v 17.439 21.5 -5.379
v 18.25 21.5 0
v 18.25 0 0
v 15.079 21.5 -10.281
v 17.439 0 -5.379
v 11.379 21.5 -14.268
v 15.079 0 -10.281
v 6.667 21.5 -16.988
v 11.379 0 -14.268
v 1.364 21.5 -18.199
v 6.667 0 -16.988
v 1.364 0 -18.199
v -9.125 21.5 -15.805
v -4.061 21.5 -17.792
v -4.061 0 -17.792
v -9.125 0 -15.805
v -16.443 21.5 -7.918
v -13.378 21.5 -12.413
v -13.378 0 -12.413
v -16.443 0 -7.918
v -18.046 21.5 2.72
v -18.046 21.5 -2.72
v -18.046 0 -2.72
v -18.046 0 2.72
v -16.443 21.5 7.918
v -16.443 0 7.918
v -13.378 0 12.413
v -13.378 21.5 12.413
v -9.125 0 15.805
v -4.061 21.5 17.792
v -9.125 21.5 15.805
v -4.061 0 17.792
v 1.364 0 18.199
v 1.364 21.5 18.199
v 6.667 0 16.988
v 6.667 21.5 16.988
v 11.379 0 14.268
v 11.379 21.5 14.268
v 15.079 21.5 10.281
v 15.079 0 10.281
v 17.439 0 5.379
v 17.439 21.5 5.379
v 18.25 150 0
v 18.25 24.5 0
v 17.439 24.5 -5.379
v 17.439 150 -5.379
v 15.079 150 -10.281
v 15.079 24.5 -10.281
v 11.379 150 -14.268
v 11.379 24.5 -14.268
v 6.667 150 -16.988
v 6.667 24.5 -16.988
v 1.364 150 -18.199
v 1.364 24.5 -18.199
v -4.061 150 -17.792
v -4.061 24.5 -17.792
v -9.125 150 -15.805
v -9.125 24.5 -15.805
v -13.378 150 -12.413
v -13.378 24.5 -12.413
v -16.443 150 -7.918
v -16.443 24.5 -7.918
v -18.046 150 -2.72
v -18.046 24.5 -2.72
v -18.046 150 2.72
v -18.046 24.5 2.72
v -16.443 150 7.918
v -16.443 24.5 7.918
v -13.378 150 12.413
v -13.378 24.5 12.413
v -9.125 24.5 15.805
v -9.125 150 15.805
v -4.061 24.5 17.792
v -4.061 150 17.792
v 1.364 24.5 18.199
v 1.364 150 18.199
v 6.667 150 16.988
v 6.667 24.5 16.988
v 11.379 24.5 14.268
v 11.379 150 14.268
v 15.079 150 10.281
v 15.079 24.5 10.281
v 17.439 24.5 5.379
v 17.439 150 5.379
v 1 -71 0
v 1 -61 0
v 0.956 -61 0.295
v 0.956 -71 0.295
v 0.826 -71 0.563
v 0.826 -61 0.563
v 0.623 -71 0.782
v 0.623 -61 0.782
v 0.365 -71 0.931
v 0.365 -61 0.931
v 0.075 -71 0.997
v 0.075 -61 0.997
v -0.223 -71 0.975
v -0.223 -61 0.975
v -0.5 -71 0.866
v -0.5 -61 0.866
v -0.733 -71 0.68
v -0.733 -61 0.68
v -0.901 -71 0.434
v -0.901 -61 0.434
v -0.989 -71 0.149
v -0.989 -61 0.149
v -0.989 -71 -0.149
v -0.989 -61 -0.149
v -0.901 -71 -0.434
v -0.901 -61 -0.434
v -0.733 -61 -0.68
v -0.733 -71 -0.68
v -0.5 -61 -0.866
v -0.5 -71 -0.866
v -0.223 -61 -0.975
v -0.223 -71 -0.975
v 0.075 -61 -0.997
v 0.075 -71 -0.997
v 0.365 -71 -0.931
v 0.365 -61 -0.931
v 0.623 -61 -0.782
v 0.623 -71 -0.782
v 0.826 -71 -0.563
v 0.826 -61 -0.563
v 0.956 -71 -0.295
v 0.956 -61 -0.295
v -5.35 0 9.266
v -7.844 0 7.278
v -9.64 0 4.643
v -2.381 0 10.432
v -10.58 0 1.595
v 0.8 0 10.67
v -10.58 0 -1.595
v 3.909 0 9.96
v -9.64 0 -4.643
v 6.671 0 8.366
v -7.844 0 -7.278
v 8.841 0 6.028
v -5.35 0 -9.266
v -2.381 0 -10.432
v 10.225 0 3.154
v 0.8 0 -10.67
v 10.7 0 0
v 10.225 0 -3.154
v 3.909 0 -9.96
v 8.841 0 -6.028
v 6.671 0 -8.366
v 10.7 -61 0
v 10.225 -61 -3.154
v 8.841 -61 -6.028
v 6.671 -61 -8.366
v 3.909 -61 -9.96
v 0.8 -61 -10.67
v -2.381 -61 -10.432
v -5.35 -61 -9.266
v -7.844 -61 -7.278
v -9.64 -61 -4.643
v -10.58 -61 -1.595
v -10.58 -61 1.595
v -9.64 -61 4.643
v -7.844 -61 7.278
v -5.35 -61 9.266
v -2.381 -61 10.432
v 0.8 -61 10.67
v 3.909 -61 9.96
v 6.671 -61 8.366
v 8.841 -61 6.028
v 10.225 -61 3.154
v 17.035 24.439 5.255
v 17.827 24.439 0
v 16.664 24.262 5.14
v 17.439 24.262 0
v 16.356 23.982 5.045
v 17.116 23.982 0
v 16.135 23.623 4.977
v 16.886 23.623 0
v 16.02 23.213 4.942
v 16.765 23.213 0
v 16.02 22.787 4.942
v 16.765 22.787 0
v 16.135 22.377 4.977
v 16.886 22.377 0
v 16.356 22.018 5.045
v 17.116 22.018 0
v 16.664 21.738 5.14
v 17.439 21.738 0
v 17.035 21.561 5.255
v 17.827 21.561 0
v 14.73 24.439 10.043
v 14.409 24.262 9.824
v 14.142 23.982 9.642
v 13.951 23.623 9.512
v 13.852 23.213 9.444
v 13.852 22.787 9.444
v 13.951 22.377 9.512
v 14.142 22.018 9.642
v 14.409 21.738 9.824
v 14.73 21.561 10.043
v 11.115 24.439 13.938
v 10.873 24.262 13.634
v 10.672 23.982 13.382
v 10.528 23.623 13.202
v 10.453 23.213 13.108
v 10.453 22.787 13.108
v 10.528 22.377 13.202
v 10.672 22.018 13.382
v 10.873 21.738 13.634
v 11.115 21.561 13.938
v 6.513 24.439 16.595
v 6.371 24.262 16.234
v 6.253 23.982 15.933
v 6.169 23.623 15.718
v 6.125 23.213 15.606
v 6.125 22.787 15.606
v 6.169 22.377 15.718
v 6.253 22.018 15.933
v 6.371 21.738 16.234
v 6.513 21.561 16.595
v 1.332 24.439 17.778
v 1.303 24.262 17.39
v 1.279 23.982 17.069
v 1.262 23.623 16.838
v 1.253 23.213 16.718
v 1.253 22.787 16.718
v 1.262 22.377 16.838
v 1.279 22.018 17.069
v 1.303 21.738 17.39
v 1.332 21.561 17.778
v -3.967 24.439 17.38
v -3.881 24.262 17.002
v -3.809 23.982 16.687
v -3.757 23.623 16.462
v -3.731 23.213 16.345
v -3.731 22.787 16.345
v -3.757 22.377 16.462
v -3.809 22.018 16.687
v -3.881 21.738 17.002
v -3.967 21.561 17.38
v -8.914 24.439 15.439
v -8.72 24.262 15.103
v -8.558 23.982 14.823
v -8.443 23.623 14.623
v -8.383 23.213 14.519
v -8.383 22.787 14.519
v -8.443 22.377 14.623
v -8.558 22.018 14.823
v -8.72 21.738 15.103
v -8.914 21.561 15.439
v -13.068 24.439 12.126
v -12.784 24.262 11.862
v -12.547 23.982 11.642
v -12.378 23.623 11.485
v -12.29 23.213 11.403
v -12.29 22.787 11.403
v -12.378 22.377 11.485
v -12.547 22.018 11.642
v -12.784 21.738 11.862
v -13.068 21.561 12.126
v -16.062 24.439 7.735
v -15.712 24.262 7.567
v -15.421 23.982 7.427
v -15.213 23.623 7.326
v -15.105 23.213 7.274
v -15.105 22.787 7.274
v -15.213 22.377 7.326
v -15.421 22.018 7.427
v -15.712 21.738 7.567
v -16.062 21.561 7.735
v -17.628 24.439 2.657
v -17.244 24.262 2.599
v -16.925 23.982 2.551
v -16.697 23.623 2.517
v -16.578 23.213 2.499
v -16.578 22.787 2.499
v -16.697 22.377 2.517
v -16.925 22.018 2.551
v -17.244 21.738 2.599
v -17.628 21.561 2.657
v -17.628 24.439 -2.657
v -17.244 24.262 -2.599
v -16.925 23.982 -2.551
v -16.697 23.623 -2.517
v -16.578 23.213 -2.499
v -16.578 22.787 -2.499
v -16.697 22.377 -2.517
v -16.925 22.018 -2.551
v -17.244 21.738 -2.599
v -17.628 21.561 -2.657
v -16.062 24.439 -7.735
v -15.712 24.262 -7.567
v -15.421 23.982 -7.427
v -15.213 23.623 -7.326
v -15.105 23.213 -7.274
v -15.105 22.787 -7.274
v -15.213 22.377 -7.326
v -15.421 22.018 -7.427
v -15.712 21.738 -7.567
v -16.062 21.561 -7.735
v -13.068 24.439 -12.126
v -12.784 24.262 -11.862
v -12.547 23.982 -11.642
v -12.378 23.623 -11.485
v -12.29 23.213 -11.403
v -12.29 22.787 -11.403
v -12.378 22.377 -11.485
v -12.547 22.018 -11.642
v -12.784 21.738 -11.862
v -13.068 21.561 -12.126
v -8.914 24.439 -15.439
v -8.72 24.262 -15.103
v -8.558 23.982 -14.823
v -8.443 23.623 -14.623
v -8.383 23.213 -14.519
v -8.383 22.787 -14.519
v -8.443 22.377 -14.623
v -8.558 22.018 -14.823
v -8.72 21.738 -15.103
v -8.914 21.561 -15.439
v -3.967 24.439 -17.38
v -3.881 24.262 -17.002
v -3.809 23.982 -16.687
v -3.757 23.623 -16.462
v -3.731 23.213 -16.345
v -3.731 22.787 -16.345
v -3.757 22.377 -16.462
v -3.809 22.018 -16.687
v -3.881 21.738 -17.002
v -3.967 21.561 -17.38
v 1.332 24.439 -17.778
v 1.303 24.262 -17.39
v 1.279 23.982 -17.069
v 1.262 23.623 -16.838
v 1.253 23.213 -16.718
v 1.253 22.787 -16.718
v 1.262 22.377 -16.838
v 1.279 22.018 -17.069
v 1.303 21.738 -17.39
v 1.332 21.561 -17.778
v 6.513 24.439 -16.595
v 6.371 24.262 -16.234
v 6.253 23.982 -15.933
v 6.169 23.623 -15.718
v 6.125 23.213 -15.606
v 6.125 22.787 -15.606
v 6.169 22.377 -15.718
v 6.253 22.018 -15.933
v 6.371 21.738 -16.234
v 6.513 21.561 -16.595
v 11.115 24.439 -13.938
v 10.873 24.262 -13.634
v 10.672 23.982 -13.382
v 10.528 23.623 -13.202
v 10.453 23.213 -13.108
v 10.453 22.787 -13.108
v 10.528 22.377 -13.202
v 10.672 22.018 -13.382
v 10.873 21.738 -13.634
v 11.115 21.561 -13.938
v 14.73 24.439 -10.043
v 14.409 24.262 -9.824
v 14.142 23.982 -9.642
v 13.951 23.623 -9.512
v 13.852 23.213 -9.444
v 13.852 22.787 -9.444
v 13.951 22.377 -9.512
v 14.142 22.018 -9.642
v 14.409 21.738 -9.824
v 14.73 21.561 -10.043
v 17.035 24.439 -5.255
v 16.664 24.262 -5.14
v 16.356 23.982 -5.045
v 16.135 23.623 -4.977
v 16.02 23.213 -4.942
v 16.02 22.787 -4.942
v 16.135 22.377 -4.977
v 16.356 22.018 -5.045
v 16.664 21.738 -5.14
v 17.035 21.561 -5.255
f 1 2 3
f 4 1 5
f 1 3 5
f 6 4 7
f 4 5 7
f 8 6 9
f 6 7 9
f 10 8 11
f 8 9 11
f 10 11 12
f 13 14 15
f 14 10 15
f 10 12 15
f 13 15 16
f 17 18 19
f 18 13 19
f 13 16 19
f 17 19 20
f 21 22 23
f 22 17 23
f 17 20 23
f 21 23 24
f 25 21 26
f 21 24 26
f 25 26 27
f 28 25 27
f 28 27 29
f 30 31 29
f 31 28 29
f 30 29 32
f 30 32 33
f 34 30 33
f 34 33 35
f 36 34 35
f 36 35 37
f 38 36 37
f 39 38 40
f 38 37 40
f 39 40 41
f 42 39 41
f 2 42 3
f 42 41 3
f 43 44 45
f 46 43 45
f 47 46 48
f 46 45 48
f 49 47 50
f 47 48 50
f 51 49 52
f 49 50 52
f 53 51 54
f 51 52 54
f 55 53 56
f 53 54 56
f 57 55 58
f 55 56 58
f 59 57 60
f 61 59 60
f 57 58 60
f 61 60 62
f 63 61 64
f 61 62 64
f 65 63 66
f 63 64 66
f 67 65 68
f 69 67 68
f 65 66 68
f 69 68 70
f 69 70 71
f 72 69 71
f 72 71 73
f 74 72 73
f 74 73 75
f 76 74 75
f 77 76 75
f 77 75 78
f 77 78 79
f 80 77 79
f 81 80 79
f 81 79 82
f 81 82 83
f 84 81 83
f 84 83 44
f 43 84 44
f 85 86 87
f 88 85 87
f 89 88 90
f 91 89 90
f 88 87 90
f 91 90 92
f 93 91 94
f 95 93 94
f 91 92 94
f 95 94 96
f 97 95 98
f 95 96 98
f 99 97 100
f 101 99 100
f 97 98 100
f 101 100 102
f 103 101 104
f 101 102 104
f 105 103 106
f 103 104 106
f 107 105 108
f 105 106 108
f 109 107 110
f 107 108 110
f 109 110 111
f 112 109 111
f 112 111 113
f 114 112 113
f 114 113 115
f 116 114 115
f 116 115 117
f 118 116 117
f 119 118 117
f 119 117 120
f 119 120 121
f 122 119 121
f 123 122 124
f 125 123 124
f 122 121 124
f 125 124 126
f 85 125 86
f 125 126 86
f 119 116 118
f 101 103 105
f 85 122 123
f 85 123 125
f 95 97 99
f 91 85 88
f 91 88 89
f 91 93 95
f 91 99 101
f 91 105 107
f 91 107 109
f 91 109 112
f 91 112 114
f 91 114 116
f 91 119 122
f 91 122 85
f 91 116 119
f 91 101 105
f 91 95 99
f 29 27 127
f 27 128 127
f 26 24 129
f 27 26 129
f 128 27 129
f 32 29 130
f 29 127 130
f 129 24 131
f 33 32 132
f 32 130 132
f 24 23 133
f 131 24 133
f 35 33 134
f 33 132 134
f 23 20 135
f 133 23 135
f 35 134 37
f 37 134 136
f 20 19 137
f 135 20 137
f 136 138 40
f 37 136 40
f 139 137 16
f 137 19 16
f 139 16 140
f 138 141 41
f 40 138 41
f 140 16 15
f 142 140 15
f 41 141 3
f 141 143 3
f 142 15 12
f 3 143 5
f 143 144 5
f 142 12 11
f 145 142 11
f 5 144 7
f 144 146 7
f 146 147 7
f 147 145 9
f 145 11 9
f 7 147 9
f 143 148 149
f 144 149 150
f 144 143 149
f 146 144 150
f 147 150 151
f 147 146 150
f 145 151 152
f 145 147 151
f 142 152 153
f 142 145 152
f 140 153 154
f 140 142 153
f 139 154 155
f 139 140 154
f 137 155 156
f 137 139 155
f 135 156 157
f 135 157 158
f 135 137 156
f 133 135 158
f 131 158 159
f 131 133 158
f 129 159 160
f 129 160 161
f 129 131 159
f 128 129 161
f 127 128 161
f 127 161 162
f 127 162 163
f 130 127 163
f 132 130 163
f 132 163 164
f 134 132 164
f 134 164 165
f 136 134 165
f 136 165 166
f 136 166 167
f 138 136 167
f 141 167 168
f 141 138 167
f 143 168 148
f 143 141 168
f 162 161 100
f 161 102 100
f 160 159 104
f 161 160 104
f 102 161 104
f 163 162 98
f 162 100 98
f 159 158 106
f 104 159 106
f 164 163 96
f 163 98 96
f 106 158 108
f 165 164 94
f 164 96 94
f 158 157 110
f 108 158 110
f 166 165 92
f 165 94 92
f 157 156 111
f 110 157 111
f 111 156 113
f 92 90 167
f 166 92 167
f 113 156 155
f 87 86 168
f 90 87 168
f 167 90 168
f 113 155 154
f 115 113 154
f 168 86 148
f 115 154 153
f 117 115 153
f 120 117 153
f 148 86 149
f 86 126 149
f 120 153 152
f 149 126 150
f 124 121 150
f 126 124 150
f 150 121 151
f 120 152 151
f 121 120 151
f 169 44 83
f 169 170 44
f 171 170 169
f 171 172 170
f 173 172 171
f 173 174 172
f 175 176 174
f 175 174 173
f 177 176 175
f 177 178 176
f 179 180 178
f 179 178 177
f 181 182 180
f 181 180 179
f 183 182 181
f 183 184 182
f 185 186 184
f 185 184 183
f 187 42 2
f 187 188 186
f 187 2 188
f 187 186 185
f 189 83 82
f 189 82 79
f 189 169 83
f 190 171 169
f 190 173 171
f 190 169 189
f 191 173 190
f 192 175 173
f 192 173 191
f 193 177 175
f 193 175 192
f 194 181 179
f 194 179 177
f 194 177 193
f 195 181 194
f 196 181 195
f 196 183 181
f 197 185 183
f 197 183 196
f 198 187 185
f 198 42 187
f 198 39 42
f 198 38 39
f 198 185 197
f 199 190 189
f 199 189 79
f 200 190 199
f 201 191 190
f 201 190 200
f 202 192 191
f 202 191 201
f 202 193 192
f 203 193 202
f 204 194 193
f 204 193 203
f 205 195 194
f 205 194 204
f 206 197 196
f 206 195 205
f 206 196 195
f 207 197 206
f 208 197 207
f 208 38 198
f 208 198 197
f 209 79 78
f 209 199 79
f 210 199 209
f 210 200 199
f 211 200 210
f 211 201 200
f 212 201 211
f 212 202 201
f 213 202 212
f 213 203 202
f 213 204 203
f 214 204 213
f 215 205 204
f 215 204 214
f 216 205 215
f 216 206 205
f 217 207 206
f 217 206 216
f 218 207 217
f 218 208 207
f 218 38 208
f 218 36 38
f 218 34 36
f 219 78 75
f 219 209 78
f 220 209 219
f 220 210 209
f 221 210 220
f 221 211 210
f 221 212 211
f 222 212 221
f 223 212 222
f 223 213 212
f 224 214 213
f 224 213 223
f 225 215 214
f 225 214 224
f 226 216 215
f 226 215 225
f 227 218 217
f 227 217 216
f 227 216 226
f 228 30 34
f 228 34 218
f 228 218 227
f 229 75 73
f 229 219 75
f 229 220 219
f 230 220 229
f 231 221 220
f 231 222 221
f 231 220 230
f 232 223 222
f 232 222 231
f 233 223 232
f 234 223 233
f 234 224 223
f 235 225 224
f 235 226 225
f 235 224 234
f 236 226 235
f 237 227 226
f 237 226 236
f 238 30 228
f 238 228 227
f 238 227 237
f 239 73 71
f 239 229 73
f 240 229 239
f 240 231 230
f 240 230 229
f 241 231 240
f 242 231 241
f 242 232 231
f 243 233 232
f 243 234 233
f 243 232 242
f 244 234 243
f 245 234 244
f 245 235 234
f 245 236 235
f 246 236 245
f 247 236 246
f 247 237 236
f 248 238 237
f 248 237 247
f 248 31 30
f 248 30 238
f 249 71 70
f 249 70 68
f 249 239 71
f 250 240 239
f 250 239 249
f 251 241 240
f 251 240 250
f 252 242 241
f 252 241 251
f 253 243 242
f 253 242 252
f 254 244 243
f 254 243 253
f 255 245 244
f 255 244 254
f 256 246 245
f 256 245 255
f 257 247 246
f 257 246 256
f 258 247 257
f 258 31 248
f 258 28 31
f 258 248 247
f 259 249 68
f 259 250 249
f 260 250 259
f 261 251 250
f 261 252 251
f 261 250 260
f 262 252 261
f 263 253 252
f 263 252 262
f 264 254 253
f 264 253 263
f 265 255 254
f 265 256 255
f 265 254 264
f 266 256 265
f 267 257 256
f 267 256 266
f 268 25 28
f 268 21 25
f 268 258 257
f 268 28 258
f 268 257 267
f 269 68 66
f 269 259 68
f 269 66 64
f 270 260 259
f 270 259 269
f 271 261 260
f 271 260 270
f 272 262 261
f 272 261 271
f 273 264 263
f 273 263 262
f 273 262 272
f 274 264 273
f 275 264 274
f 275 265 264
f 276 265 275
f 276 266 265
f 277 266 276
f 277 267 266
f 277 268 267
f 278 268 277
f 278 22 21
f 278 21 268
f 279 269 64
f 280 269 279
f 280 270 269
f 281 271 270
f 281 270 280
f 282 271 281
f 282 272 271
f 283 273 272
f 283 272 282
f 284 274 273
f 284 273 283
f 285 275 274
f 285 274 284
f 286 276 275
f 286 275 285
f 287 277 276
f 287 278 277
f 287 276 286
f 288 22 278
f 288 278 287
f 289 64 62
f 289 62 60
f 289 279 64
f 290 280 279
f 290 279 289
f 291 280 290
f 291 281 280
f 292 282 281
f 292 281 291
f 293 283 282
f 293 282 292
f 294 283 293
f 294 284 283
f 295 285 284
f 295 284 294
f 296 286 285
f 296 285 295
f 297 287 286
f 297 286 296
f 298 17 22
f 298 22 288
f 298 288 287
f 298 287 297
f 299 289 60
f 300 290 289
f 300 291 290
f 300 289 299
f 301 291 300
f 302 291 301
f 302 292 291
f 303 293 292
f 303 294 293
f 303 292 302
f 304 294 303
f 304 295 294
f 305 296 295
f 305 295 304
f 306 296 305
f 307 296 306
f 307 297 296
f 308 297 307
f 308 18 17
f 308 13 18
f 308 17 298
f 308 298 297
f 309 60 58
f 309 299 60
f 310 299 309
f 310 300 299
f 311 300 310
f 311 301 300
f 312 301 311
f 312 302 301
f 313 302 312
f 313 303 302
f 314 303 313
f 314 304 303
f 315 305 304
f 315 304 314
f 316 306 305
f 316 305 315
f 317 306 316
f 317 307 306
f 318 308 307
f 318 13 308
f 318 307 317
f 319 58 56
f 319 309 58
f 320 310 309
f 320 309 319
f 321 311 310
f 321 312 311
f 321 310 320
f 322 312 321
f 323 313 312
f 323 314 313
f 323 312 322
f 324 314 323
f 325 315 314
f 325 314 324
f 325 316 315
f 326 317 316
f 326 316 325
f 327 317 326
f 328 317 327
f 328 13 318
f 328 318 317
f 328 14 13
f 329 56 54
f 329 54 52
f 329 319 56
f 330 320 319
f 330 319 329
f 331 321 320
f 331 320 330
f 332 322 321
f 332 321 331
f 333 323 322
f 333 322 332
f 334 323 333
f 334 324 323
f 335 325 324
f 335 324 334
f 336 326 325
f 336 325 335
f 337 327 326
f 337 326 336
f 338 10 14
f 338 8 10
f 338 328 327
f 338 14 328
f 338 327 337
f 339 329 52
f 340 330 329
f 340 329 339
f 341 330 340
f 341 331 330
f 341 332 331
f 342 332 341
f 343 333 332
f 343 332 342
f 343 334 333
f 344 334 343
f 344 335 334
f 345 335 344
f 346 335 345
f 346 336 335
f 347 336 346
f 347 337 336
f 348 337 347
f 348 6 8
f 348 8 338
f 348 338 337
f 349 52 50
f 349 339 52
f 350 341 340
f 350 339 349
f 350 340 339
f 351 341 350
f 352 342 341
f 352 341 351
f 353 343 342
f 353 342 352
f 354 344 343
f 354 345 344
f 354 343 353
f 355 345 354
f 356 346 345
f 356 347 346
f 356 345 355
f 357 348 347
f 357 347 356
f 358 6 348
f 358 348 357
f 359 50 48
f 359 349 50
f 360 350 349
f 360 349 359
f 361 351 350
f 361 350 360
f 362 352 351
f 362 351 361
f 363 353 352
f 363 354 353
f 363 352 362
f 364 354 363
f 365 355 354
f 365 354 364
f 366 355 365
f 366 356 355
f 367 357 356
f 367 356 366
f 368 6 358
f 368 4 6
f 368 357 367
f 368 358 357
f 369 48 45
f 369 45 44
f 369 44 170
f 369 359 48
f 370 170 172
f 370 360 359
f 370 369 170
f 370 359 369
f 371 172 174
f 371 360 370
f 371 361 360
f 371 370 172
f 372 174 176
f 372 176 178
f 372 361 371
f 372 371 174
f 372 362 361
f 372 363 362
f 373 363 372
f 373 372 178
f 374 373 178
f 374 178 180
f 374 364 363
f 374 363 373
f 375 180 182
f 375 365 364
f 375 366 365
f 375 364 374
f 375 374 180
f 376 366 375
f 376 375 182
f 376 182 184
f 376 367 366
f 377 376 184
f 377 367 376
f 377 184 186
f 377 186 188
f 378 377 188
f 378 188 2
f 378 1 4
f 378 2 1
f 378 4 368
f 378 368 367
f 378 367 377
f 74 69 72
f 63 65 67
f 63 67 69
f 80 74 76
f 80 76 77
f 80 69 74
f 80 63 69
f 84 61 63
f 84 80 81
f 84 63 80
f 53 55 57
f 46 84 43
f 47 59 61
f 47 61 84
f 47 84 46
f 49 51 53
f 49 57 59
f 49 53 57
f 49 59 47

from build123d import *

# Parameters (mm, degrees)
ESQUISSE1_R        = 10.7
BOSS_EXTRU_1_DEPTH = 61
ESQUISSE2_R        = 18.25
BOSS_EXTRU_2_DEPTH = 150
ESQUISSE3_R        = 1
BOSS_EXTRU_3_DEPTH = 10


with BuildPart() as part:
    # Esquisse1 → Boss.-Extru.1 (new body)
    with BuildSketch(Plane(origin=(0, 0, 0), x_dir=(1, 0, 0), z_dir=(0, 1, 0))):
        Circle(ESQUISSE1_R)
    extrude(amount=-BOSS_EXTRU_1_DEPTH)

    # Esquisse2 → Boss.-Extru.2 (add)
    with BuildSketch(Plane(origin=(0, 0, 0), x_dir=(1, 0, 0), z_dir=(0, 1, 0))):
        Circle(ESQUISSE2_R)
    extrude(amount=BOSS_EXTRU_2_DEPTH)

    # Esquisse3 → Boss.-Extru.3 (add)
    with BuildSketch(Plane.XZ.offset(61)):
        Circle(ESQUISSE3_R)
    extrude(amount=BOSS_EXTRU_3_DEPTH)

    # Esquisse4 → Enlèvement de matière-Révolution1 (revolve, cut)
    with BuildSketch(Plane.XY):
        with BuildLine():
            Line((18.25, 21.5), (18.25, 24.5))
            ThreePointArc((18.25, 24.5), (16.75, 23), (18.25, 21.5))
        make_face()
    revolve(axis=Axis((0, 150, 0), (0, -1, 0)), mode=Mode.SUBTRACT)


solid = part.part
